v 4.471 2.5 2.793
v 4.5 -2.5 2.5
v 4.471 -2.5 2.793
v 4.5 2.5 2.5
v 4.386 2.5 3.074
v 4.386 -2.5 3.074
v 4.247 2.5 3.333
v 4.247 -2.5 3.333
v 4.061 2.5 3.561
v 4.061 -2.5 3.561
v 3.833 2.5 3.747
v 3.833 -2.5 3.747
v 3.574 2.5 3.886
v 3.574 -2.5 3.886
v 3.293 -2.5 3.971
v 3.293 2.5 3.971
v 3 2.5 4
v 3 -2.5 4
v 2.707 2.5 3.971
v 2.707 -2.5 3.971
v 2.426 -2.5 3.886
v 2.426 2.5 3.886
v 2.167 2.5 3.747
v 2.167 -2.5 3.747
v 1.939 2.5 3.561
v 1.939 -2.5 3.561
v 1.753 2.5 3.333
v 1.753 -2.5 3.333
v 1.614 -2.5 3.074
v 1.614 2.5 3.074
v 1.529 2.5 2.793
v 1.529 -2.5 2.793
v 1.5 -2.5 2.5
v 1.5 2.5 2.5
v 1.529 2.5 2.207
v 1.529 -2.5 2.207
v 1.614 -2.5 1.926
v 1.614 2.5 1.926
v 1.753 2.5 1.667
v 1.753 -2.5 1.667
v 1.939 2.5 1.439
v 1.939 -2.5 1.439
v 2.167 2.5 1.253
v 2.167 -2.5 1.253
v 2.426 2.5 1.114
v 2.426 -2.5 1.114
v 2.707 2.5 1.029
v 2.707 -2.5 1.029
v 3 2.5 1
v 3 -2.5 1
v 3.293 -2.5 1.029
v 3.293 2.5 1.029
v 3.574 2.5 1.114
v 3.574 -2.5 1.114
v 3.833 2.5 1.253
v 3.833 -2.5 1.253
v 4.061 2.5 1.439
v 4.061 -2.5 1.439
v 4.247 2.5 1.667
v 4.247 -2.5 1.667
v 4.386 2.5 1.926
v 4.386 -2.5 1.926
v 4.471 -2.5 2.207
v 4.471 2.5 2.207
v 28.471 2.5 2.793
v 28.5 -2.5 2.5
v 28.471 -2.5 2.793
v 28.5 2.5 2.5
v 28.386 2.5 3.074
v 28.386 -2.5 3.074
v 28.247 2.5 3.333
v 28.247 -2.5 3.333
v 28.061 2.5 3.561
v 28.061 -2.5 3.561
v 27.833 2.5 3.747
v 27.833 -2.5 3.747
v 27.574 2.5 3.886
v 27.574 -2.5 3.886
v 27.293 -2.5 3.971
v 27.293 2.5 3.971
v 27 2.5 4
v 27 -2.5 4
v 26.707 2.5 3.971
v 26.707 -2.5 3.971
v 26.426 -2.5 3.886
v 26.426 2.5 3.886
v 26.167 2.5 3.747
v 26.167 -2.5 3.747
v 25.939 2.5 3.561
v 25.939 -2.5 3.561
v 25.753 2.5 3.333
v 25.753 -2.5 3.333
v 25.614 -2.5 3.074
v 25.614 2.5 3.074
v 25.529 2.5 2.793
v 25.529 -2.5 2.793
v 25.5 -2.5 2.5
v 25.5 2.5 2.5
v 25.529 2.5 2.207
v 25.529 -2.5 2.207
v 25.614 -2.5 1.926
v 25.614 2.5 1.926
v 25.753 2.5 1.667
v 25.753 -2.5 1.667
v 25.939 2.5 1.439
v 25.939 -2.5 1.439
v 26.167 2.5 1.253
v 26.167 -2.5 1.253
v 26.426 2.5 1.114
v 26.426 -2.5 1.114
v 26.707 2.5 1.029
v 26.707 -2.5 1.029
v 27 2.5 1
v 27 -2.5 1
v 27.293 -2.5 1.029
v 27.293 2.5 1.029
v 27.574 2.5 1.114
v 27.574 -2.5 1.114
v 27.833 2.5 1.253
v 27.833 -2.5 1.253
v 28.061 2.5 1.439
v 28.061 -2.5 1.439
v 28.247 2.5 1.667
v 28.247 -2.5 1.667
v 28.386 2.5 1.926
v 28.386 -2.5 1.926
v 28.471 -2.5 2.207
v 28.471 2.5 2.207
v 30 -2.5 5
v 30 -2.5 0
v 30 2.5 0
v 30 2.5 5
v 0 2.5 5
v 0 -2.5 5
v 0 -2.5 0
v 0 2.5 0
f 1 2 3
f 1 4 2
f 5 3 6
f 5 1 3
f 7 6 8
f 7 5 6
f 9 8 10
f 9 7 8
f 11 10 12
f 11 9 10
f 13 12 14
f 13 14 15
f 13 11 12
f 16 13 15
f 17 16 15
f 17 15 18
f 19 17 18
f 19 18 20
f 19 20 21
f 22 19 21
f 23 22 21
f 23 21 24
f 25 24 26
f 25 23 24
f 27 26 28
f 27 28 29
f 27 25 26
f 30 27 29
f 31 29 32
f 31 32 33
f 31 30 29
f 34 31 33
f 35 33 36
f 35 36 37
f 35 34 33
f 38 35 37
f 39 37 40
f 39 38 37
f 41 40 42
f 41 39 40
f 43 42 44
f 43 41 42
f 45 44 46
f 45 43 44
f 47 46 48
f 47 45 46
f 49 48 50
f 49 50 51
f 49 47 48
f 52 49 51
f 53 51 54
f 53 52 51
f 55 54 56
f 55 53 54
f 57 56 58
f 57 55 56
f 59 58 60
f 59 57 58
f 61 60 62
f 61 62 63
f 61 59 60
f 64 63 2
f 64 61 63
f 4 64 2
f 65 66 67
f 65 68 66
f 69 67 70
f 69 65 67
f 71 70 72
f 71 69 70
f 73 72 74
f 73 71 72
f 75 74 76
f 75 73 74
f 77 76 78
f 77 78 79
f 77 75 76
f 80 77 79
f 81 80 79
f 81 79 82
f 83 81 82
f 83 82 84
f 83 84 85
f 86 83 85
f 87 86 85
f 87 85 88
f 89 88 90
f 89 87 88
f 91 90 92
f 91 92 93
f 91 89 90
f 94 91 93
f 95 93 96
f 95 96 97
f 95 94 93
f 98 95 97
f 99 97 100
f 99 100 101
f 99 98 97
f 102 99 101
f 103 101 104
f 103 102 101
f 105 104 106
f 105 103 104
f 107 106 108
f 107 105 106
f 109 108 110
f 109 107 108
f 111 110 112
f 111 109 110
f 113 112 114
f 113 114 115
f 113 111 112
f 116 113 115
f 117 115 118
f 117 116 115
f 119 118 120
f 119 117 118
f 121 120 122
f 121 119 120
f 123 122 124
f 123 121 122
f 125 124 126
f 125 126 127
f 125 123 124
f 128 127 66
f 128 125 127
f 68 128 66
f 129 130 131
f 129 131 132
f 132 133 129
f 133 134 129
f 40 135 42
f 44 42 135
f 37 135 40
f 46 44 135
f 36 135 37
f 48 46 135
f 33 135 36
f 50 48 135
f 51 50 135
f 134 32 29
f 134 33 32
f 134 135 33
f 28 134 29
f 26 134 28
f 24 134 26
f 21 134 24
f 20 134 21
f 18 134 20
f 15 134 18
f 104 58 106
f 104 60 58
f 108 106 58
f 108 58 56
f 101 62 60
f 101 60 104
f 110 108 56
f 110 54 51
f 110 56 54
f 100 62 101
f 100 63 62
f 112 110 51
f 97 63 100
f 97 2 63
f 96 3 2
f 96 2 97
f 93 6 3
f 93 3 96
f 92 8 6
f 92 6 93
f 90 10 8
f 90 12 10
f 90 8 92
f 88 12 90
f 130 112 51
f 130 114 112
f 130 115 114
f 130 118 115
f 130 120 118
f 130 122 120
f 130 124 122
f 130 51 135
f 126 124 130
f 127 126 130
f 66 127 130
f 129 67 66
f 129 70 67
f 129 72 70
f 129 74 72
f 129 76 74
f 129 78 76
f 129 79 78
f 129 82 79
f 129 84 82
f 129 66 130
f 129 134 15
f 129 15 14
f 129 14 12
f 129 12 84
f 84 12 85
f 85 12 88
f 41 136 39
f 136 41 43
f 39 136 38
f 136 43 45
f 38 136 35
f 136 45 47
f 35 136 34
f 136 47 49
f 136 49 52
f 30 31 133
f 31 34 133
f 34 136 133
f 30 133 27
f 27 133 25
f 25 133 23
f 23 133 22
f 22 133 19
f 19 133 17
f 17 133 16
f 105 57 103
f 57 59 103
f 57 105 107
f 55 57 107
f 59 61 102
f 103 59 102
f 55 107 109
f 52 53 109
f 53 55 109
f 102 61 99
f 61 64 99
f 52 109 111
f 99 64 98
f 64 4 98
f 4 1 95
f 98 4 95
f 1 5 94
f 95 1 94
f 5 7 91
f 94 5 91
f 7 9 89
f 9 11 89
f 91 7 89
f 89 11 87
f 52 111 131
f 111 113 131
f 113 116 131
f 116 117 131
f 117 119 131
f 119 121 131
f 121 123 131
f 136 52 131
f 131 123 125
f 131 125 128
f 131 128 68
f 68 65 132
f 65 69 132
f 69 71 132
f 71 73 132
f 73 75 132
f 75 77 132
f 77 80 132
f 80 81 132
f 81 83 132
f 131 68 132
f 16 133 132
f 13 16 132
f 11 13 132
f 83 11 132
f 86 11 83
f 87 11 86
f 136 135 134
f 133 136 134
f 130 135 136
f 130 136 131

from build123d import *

# Parameters (mm, degrees)
F0_W     = 30
F0_H     = 5
F0_R     = 1.5
F1_DEPTH = 2.5


with BuildPart() as f1:
    # F0 (on Front) → F1 (new body, symmetric)
    with BuildSketch(Plane.XZ):
        with Locations((15, 2.5)):
            Rectangle(F0_W, F0_H)
        with Locations((3, 2.5)):
            Circle(F0_R, mode=Mode.SUBTRACT)
        with Locations((27, 2.5)):
            Circle(F0_R, mode=Mode.SUBTRACT)
    extrude(amount=F1_DEPTH, both=True)


solid = f1.part
